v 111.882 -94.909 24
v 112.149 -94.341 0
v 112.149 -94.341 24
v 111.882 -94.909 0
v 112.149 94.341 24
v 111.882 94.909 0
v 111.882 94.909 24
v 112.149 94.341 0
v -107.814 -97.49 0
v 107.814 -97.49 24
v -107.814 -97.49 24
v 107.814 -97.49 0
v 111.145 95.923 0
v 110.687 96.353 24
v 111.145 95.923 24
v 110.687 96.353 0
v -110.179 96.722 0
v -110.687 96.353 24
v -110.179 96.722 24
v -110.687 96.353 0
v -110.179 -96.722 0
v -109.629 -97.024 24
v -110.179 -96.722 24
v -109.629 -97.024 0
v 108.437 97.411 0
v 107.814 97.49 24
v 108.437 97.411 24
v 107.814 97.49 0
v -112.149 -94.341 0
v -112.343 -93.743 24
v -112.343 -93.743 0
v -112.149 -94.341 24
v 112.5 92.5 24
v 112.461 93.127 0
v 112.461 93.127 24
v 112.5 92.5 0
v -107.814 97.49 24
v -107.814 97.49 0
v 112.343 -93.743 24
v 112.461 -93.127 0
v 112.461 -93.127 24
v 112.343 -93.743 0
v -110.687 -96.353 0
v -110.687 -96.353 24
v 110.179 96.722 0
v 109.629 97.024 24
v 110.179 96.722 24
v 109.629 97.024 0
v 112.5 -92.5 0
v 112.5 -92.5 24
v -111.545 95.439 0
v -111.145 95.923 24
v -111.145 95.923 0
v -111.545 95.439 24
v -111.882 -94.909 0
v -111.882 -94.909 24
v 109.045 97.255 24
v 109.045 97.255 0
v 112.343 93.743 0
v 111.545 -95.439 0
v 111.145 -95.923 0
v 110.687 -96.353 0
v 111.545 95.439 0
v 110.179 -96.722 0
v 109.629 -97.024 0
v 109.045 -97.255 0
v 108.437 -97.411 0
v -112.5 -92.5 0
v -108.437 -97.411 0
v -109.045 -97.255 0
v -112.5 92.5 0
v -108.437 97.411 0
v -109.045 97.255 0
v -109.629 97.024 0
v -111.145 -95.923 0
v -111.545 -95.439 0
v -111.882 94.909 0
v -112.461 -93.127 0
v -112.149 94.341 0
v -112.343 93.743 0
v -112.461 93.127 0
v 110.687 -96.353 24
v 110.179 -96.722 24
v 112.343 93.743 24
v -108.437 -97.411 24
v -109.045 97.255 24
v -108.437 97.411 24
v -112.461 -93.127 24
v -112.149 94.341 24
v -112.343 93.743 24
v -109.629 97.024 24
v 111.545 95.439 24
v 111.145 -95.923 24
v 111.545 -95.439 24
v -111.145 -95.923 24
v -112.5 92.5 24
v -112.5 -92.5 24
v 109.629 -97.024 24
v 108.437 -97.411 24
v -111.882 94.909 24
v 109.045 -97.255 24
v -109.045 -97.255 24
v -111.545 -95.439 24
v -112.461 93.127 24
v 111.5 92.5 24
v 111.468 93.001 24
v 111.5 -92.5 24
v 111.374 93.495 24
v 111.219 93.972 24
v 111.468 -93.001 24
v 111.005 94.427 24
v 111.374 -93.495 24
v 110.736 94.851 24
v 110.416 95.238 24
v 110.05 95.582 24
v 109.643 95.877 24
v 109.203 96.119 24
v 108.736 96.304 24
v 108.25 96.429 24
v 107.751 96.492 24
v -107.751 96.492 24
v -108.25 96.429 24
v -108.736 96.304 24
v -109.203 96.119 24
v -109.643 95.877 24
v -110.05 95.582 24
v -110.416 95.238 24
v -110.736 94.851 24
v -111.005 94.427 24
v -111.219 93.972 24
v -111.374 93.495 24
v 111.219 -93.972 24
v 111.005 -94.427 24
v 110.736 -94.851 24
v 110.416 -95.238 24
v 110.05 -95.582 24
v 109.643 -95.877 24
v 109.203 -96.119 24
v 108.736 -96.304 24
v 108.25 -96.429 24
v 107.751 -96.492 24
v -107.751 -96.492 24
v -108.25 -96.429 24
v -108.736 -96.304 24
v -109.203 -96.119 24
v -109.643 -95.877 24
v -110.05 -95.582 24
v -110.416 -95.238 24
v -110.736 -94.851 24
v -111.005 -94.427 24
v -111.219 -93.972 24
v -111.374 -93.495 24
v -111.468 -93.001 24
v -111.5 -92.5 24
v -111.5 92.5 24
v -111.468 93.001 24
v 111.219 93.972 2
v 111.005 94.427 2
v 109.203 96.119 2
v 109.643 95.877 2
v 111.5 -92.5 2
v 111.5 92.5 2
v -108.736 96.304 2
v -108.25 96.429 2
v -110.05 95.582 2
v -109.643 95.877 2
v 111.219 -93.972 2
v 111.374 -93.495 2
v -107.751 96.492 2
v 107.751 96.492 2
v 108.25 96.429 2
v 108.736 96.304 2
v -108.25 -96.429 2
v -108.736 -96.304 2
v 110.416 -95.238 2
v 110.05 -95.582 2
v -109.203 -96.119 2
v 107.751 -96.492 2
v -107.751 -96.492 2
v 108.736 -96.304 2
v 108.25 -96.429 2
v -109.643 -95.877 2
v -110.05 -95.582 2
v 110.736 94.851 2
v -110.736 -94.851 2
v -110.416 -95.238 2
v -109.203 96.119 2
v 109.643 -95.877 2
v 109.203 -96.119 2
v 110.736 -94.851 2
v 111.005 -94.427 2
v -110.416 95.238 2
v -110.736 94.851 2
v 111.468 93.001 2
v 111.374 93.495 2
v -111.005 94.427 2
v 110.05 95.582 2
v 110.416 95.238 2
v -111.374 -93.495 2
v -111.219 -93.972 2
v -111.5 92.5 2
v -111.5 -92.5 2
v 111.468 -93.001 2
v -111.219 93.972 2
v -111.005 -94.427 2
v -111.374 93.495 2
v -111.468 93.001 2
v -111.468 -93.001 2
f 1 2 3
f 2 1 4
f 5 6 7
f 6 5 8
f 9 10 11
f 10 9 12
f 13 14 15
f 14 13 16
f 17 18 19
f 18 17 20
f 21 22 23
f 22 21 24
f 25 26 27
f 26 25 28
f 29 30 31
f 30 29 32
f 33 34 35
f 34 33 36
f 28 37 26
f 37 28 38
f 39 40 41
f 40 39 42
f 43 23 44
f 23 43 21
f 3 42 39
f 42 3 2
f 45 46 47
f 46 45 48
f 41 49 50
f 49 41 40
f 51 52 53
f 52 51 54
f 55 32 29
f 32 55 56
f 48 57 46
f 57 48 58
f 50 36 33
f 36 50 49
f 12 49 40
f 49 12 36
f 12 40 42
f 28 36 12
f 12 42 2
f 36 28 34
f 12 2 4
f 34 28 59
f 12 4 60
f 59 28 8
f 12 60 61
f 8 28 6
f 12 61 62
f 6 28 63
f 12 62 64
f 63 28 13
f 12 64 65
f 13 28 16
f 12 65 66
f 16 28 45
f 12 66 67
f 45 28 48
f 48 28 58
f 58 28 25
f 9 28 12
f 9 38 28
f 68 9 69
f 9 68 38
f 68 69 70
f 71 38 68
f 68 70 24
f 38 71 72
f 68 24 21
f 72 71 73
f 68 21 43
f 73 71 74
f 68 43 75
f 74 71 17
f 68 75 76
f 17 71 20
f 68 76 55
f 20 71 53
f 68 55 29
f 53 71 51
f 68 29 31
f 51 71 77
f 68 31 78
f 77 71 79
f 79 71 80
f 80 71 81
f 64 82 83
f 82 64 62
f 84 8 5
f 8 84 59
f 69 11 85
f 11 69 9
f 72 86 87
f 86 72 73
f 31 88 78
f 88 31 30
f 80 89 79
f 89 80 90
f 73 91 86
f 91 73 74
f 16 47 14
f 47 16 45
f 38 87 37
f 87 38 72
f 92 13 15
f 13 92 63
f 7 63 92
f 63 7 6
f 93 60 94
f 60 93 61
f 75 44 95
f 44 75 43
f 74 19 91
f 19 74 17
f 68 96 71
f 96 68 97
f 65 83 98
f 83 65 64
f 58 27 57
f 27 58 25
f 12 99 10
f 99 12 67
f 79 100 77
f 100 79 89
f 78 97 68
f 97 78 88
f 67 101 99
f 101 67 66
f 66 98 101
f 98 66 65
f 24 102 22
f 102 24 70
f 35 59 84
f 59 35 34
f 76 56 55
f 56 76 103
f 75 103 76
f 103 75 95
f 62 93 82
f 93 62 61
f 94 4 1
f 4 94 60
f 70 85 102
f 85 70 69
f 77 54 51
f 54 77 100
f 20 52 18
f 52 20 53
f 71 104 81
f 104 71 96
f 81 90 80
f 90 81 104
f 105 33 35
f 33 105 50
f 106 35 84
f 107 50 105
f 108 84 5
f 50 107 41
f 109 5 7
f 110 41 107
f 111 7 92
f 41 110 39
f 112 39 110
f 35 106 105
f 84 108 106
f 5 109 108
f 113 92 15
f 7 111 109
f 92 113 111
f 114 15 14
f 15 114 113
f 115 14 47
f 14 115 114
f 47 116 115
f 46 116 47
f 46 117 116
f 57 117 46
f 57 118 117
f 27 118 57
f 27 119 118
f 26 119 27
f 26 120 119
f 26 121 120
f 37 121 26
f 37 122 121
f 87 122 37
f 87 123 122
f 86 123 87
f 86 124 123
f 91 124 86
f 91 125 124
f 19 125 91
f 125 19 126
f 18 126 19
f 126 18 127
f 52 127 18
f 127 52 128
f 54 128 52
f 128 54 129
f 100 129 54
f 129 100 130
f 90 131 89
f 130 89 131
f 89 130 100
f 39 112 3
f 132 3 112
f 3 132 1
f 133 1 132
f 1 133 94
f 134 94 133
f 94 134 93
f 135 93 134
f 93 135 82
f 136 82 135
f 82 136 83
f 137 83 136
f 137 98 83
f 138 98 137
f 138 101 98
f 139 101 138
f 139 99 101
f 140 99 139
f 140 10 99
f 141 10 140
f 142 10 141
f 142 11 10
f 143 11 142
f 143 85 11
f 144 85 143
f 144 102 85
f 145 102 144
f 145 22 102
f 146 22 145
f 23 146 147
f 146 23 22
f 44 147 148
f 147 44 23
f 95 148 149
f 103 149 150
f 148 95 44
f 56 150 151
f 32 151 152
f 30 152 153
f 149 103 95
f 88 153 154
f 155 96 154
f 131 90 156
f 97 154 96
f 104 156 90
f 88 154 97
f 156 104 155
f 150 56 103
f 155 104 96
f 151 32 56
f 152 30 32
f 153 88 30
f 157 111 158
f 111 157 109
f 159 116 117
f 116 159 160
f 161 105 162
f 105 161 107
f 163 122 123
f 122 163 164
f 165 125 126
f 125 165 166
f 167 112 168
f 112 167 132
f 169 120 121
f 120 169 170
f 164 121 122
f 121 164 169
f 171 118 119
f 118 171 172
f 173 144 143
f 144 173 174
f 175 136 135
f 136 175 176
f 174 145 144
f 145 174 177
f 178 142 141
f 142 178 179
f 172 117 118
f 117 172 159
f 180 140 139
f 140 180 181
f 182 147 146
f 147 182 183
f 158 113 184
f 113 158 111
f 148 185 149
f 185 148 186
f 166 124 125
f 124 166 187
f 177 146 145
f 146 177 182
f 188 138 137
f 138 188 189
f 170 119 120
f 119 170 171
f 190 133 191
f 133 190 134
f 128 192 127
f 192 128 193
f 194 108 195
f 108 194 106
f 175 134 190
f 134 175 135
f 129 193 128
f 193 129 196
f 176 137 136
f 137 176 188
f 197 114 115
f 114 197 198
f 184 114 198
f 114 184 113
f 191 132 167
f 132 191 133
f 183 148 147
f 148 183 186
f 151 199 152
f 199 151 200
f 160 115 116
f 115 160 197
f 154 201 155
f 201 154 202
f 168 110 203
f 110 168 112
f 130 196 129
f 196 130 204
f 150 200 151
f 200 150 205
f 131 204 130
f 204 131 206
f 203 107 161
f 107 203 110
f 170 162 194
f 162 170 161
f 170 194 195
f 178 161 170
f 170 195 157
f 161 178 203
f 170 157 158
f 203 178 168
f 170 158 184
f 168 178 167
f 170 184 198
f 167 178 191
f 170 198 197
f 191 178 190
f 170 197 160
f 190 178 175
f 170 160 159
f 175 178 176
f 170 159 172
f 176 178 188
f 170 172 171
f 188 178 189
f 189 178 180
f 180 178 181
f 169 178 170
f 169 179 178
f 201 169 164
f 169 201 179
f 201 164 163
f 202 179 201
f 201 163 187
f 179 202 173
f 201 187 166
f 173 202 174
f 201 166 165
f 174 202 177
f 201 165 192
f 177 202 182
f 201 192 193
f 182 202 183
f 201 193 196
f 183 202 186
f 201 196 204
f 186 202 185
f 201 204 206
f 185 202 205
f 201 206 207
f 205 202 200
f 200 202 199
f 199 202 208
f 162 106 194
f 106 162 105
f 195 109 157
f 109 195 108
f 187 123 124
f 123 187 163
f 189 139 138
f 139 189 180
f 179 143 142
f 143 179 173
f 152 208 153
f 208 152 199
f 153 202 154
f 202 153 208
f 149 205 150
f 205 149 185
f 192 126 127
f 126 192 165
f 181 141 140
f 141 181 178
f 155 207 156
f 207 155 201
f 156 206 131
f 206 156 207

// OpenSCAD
$fn = 50;


difference() {
	union() {
		hull() {
			translate(v = [-107.5000000000, 92.5000000000, 0]) {
				cylinder(h = 24, r = 5);
			}
			translate(v = [107.5000000000, 92.5000000000, 0]) {
				cylinder(h = 24, r = 5);
			}
			translate(v = [-107.5000000000, -92.5000000000, 0]) {
				cylinder(h = 24, r = 5);
			}
			translate(v = [107.5000000000, -92.5000000000, 0]) {
				cylinder(h = 24, r = 5);
			}
		}
	}
	union() {
		translate(v = [0, 0, 2]) {
			hull() {
				translate(v = [-107.5000000000, 92.5000000000, 0]) {
					cylinder(h = 22, r = 4);
				}
				translate(v = [107.5000000000, 92.5000000000, 0]) {
					cylinder(h = 22, r = 4);
				}
				translate(v = [-107.5000000000, -92.5000000000, 0]) {
					cylinder(h = 22, r = 4);
				}
				translate(v = [107.5000000000, -92.5000000000, 0]) {
					cylinder(h = 22, r = 4);
				}
			}
		}
	}
}
